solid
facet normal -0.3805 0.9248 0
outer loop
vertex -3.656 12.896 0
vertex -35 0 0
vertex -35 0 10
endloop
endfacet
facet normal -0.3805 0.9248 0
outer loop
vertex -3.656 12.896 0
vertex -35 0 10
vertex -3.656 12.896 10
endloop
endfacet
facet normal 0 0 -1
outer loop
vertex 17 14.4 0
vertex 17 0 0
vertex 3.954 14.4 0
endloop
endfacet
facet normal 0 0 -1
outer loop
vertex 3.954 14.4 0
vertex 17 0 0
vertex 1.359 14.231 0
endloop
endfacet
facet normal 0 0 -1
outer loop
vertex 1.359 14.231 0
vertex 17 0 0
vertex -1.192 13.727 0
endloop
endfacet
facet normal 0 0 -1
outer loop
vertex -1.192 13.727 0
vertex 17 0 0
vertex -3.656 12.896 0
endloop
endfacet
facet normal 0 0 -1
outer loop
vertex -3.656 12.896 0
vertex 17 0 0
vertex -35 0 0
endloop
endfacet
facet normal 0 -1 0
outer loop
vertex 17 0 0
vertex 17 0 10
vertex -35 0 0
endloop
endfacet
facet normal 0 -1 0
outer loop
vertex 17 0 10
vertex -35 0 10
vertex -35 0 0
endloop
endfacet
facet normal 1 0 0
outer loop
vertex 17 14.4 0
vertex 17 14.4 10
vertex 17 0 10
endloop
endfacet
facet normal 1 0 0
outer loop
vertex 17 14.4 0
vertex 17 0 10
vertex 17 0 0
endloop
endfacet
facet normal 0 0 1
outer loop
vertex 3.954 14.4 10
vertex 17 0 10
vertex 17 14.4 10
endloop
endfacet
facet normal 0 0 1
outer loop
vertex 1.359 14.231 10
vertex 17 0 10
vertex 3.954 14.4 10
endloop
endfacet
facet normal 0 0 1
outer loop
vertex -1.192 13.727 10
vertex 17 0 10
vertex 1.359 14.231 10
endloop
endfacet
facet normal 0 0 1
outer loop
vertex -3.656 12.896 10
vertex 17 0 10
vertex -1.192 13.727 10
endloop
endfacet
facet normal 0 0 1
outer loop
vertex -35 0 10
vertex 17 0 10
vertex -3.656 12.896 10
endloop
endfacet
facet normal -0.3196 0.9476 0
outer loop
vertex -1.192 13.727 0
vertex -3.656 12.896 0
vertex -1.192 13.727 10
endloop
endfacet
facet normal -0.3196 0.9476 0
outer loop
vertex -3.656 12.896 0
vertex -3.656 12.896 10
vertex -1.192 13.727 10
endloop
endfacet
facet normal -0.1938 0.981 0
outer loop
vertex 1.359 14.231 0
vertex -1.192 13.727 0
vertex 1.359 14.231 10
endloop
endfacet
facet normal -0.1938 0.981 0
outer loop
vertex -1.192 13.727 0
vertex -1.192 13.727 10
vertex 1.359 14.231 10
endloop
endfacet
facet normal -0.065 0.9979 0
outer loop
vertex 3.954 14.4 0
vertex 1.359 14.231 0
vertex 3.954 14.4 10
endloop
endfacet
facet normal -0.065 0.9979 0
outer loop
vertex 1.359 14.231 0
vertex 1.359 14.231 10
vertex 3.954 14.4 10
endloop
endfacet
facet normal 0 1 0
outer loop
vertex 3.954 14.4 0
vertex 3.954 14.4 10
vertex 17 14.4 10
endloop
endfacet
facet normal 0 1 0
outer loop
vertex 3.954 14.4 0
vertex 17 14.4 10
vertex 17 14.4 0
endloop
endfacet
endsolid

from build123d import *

# Parameters (mm, degrees)
EXTRUDE_1_DEPTH = 10
SKETCH_3_W      = 10
SKETCH_3_H      = 14.4
EXTRUDE_2_DEPTH = 17
FILLET_1_R      = 20


with BuildPart() as part:
    # 草图1 → 凸台-拉伸1 (new body)
    with BuildSketch(Plane.XY):
        Polygon((0, 0), (-35, 0), (0, 14.4), align=None)
    extrude(amount=EXTRUDE_1_DEPTH)

    # 草图3 → 凸台-拉伸2 (add)
    with BuildSketch(Plane(origin=(0, 0, 0), x_dir=(0, 0, -1), z_dir=(1, 0, 0))):
        with Locations((-5, 7.2)):
            Rectangle(SKETCH_3_W, SKETCH_3_H)
    extrude(amount=EXTRUDE_2_DEPTH)

    # 圆角1
    fillet_1_edges = [part.edges().sort_by_distance(p)[0] for p in [
        (0, 14.4, 5),
    ]]
    fillet(fillet_1_edges, radius=FILLET_1_R)


solid = part.part
